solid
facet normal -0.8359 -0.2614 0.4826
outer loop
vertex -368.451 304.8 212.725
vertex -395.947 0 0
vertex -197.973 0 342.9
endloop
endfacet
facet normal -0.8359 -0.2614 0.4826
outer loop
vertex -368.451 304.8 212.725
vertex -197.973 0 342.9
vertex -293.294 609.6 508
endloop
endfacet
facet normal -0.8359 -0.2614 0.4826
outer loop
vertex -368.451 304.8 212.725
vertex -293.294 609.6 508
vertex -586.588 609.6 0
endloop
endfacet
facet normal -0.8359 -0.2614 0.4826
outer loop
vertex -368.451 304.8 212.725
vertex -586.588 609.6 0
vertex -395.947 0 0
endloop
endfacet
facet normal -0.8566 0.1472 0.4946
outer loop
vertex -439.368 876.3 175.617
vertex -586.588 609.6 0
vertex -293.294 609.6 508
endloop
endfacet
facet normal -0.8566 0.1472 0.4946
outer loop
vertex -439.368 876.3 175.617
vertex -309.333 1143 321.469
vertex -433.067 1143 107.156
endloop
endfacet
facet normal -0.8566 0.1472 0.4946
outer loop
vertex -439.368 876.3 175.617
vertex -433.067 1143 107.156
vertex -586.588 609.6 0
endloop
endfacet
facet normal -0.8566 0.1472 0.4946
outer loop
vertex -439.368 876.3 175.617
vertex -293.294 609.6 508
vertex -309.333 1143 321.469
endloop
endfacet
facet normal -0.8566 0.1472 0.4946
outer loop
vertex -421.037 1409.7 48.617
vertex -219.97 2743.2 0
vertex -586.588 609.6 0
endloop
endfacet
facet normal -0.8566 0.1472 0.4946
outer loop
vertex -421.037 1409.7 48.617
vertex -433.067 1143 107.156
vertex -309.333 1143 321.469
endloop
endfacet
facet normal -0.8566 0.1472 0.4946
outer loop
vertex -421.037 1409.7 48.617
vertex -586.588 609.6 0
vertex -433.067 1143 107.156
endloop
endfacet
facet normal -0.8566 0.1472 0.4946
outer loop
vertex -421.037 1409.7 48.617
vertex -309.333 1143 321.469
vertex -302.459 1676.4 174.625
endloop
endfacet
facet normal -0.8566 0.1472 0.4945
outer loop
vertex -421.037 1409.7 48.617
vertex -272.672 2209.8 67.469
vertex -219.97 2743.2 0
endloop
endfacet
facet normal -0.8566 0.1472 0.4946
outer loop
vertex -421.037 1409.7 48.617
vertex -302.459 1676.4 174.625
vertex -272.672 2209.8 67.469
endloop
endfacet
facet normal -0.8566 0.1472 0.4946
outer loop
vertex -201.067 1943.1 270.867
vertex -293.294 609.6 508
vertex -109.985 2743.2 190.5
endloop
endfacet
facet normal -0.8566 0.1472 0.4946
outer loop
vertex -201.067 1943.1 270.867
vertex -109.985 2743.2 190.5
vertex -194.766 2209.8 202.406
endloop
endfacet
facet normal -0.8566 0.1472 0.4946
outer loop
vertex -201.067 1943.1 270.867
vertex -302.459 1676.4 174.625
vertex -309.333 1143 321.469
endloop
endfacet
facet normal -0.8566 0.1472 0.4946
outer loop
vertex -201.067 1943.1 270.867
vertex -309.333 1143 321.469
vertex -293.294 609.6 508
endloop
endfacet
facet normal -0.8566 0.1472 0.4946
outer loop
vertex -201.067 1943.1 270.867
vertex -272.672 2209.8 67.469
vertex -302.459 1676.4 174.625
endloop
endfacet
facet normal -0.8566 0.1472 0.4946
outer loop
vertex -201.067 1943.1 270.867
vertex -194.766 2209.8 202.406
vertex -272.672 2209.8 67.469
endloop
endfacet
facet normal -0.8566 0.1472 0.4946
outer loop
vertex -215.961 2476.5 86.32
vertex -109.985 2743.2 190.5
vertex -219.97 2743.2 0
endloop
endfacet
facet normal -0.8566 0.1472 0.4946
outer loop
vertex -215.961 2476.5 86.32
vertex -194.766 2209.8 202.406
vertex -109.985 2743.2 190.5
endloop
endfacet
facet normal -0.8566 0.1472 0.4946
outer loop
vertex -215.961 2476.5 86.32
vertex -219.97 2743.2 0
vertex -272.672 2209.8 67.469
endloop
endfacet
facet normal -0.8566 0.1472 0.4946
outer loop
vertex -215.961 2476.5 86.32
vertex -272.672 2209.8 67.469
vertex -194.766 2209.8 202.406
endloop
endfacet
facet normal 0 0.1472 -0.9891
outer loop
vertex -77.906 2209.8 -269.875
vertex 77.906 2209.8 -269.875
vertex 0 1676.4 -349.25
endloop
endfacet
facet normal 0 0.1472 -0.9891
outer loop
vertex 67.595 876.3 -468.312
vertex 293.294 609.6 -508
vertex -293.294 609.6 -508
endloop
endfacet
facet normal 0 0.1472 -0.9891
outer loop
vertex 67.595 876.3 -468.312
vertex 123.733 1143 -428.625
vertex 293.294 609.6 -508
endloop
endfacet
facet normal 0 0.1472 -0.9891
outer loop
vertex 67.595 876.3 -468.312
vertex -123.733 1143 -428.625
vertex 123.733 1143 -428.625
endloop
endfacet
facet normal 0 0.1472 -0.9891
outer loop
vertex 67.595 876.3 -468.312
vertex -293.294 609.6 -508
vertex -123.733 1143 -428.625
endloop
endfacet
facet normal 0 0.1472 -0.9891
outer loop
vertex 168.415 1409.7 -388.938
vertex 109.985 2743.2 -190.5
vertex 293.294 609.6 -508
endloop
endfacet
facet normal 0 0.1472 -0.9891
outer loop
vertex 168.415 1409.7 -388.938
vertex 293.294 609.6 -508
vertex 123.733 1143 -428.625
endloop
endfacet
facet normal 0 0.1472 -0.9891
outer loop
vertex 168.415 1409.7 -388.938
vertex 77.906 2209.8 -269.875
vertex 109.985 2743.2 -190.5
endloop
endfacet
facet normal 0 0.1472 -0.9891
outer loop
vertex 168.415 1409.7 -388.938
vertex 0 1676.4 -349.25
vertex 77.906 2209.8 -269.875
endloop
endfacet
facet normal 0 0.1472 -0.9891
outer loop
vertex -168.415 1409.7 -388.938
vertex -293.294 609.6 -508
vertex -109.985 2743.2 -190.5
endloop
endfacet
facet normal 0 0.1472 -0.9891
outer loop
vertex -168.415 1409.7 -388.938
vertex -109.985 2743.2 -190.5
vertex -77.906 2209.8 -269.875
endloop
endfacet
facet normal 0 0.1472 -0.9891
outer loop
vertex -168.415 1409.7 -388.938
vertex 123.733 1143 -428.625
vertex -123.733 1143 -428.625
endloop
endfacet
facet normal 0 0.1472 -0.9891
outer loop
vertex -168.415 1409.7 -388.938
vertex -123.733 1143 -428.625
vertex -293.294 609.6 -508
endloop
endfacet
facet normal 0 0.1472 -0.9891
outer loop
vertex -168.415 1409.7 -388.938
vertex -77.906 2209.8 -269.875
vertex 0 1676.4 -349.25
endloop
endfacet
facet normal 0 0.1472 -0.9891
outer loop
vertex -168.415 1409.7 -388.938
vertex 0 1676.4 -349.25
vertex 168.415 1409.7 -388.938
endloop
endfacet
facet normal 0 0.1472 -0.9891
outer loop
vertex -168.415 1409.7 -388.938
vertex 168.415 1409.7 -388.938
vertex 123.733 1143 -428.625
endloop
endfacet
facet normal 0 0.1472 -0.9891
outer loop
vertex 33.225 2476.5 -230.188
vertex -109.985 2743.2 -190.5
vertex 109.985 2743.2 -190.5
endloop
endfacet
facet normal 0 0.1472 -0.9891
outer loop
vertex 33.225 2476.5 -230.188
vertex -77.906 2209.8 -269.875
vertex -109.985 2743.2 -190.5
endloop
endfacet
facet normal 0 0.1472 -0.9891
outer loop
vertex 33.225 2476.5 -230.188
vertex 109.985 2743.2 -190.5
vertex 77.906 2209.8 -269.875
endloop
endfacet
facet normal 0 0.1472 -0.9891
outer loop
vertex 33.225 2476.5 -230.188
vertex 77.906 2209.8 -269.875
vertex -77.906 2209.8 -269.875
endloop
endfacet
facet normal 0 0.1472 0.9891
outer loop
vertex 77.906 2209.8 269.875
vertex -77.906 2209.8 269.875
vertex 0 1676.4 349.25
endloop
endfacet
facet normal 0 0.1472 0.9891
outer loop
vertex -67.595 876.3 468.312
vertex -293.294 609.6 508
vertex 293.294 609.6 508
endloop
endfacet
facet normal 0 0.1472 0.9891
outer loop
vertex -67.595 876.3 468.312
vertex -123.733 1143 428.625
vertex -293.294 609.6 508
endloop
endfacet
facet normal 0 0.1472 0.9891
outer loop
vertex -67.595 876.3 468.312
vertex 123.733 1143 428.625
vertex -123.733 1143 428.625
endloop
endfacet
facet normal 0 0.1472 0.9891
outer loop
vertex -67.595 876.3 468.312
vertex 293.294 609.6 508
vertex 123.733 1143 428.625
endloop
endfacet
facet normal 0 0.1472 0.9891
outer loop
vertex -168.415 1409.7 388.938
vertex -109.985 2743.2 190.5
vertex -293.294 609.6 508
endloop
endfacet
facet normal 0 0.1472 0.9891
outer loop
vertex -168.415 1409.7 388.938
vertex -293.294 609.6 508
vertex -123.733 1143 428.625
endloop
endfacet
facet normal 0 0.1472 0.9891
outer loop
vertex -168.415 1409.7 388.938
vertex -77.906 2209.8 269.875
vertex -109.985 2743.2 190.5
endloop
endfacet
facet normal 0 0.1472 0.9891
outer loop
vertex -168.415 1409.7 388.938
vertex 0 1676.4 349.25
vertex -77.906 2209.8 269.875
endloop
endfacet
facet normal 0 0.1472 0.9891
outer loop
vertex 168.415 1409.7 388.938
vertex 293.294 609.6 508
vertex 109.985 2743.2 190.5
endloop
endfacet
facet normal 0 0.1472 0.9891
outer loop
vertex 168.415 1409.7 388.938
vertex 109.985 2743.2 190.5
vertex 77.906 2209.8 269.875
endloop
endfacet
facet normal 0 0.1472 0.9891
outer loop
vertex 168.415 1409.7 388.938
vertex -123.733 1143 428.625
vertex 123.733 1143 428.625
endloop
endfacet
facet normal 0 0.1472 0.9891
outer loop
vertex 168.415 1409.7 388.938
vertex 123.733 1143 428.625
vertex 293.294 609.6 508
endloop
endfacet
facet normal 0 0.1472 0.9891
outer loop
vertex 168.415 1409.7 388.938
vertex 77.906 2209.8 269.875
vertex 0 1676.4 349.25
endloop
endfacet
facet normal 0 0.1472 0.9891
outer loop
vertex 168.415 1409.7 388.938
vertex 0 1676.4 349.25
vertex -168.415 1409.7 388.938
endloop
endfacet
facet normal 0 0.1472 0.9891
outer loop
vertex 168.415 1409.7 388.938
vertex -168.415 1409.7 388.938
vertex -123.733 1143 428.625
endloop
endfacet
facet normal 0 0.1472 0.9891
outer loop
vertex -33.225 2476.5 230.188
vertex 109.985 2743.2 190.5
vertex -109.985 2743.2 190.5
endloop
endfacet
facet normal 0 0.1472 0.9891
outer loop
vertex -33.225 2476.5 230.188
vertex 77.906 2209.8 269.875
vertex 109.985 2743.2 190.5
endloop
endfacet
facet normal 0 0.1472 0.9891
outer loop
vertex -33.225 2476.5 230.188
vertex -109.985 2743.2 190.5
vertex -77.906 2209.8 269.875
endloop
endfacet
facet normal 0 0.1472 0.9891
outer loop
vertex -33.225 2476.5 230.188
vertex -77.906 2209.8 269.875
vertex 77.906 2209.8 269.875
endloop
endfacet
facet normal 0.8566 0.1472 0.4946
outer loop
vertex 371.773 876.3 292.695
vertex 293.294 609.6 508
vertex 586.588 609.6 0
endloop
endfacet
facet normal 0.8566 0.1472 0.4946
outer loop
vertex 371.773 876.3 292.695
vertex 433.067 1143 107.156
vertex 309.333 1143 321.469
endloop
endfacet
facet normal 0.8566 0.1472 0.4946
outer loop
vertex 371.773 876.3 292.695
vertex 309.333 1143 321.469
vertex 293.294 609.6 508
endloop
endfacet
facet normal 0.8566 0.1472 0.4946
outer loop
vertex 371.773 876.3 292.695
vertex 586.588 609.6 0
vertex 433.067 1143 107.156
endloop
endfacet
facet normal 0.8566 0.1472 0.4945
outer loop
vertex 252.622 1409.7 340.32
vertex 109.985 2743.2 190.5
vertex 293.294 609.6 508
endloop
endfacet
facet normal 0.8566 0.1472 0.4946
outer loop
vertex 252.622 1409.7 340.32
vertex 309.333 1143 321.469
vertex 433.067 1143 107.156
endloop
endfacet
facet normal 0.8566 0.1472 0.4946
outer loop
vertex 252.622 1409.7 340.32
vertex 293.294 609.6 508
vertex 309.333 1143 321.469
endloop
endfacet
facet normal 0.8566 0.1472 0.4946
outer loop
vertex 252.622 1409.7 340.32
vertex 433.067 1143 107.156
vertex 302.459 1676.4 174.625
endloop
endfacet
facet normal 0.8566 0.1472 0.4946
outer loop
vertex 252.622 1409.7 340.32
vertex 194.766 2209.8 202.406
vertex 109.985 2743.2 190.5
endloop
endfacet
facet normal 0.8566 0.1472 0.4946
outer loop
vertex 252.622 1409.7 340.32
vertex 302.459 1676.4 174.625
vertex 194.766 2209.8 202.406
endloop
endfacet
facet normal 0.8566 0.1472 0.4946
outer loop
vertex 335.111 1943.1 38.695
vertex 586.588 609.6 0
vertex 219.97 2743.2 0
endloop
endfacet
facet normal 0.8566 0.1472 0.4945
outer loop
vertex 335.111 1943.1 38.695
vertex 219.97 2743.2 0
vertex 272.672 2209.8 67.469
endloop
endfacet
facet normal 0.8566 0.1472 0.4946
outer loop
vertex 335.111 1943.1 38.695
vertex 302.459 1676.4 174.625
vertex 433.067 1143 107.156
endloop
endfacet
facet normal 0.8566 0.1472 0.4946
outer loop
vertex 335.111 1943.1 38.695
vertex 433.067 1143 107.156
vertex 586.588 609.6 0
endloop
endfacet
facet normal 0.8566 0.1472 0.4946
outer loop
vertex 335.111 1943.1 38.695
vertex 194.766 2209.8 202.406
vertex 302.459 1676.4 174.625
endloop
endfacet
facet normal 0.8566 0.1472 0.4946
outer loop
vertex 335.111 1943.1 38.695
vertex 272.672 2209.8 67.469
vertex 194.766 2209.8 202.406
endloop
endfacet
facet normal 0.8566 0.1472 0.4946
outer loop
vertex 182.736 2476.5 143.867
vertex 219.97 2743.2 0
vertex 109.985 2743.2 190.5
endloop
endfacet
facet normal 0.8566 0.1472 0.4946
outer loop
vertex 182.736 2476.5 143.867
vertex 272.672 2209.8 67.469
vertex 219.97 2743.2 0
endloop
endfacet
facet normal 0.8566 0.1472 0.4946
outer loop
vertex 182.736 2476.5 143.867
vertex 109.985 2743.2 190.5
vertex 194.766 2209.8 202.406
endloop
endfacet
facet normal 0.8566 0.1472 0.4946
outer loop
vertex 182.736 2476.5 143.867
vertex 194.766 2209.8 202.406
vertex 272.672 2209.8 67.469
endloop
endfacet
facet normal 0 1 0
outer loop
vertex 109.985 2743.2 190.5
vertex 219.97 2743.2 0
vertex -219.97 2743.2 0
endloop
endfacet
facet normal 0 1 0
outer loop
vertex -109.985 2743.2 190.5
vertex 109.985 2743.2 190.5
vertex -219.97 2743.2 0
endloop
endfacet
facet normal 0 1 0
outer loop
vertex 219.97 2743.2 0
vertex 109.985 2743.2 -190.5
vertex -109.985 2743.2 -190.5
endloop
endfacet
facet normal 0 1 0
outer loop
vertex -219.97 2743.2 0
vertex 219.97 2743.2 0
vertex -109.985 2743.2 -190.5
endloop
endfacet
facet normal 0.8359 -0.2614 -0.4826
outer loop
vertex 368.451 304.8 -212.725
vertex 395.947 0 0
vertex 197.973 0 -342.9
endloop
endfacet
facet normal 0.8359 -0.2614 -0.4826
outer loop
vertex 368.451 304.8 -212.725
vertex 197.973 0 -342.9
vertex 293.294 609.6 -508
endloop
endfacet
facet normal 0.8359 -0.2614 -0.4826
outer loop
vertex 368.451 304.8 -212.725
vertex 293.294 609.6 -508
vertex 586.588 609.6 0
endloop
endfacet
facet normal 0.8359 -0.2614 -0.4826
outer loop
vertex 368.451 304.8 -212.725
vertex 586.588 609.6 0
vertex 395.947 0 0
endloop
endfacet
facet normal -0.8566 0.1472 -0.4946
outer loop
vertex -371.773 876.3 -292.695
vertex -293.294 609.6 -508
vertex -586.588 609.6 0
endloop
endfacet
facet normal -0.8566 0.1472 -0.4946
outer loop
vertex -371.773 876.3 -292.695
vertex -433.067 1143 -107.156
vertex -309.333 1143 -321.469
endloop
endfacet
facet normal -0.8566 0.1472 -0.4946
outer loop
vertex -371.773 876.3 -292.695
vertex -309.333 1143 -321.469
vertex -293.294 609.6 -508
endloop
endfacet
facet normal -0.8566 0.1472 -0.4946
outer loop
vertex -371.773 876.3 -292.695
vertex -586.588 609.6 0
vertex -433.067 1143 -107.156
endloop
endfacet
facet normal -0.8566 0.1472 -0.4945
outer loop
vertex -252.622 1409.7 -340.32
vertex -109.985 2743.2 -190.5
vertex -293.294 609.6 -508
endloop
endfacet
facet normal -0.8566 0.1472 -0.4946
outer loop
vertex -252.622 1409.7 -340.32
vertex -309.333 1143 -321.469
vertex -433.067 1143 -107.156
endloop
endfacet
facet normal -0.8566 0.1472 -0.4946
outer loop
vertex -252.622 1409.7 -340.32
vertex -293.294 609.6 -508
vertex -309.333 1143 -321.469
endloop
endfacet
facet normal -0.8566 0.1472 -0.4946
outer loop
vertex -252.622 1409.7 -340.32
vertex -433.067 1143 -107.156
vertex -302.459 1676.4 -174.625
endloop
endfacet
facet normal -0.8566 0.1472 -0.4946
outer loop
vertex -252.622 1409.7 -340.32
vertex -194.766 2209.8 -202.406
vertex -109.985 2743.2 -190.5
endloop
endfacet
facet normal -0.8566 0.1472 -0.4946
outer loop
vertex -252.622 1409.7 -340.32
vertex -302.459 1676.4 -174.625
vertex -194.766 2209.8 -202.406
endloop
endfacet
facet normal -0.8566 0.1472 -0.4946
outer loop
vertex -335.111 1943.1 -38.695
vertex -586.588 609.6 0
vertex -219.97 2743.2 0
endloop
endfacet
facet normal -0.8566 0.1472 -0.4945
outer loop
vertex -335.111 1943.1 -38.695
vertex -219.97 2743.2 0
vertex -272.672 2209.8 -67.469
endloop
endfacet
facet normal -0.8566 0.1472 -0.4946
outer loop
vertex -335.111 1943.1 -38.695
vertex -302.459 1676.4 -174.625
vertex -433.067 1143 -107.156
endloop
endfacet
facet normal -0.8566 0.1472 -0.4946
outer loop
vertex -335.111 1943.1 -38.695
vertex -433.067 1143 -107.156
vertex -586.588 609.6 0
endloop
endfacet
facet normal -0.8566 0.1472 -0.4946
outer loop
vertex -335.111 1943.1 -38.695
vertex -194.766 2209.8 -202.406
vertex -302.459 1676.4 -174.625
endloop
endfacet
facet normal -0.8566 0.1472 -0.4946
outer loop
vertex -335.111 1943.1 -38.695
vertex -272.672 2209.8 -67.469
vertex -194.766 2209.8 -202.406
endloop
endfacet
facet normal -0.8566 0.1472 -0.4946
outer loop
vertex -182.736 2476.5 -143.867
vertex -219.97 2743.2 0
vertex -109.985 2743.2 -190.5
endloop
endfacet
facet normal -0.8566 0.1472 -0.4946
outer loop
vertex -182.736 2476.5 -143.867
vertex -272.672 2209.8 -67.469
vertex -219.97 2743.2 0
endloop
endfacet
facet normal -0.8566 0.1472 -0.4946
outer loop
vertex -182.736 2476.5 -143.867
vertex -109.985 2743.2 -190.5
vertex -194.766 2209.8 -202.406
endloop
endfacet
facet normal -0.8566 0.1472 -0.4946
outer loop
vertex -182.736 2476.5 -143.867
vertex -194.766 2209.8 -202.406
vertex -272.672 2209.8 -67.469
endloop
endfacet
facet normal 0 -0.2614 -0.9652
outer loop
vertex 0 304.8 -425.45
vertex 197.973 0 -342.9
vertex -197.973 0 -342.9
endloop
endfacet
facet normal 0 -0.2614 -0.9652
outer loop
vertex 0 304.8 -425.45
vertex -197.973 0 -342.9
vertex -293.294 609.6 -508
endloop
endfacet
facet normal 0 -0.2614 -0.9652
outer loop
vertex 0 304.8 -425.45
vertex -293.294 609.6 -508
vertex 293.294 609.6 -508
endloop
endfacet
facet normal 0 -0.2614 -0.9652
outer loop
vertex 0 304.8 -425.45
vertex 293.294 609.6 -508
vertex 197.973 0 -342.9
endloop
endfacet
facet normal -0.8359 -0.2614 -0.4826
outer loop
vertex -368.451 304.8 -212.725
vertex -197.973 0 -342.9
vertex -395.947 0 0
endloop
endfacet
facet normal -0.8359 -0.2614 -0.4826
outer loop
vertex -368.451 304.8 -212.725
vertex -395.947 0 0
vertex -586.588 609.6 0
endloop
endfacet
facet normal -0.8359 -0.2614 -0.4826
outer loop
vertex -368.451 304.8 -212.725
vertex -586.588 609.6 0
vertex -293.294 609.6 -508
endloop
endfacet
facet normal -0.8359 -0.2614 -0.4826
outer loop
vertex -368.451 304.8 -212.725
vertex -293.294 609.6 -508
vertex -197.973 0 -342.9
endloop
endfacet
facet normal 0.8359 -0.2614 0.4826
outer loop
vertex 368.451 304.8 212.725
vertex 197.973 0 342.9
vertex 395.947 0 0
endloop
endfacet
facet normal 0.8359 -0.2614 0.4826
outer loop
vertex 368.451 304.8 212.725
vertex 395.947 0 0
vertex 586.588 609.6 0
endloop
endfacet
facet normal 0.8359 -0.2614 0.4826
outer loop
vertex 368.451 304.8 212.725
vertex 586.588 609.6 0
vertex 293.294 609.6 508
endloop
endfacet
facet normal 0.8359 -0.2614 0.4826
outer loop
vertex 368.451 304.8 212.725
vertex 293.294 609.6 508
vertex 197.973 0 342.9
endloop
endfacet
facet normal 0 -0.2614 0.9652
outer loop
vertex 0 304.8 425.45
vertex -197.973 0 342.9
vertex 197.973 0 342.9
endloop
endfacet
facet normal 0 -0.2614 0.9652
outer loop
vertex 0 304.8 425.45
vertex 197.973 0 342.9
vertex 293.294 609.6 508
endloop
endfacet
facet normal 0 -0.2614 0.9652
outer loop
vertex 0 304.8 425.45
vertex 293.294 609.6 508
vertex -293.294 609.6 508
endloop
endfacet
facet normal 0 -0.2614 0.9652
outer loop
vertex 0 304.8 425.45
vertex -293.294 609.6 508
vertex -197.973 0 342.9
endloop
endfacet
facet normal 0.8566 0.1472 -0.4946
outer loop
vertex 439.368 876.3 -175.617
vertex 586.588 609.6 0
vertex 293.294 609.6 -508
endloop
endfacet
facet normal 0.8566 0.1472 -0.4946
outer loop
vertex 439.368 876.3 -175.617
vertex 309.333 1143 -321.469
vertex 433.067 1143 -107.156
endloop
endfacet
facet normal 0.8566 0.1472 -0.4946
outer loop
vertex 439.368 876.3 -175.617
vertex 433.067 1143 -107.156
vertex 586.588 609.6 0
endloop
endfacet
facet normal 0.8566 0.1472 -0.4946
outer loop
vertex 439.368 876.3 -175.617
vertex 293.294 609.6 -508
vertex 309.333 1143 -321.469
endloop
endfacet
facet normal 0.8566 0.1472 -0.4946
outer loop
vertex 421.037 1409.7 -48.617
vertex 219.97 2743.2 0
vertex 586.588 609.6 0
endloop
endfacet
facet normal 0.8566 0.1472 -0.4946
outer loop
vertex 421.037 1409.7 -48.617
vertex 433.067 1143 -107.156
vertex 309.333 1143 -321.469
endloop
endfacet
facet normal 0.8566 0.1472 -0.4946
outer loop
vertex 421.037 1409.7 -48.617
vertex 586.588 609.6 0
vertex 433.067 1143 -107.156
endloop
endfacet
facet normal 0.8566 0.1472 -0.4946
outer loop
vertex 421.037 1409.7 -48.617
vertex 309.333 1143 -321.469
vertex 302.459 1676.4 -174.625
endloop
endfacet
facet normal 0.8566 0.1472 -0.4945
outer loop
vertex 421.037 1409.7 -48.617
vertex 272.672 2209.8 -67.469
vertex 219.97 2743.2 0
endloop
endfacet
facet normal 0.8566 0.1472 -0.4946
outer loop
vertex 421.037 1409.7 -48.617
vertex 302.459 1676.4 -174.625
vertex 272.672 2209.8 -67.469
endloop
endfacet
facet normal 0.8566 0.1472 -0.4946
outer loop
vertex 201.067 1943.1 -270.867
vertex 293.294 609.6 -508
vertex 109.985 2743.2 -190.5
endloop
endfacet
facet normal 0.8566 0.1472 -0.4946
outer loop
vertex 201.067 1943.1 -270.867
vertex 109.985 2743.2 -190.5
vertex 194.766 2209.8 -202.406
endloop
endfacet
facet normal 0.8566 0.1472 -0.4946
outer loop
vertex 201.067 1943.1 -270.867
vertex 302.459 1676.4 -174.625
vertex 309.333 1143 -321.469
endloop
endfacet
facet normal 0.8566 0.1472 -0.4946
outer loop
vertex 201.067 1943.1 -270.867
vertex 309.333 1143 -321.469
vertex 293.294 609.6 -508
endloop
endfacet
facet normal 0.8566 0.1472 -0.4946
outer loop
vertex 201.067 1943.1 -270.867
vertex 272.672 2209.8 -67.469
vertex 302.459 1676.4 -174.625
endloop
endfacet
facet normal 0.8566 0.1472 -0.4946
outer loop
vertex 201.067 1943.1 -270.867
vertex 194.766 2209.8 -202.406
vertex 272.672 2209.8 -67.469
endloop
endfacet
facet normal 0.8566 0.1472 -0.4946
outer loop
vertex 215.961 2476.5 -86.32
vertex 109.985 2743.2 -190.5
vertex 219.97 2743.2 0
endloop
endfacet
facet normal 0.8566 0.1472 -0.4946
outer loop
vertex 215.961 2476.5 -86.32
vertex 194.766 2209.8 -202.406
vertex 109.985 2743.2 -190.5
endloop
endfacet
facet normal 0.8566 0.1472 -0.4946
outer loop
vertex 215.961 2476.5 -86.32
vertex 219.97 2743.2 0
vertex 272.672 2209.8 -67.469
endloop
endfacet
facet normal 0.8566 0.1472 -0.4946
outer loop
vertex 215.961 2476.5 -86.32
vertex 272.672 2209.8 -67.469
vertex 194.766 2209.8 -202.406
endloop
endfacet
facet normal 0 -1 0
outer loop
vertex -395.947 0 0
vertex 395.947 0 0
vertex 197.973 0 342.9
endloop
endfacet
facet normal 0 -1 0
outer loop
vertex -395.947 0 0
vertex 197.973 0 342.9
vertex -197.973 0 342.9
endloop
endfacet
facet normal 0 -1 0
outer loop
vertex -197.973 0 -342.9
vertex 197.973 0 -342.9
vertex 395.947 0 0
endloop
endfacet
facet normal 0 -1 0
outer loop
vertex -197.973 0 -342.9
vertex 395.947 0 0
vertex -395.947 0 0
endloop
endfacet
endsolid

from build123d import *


with BuildPart() as part:
    # Sketch1 → Loft6 section 0
    with BuildSketch(Plane(origin=(0, 0, 0), x_dir=(1, 0, 0), z_dir=(0, 1, 0))):
        with BuildLine():
            Line((395.94681461, 0), (197.973407305, 342.9))
            Line((197.973407305, 342.9), (-197.973407305, 342.9))
            Line((-197.973407305, 342.9), (-395.94681461, 0))
            Line((-395.94681461, 0), (-197.973407305, -342.9))
            Line((-197.973407305, -342.9), (197.973407305, -342.9))
            Line((197.973407305, -342.9), (395.94681461, 0))
        make_face()
    # Sketch3 → Loft6 section 1
    with BuildSketch(Plane(origin=(0, 609.6, 0), x_dir=(-1, 0, 0), z_dir=(0, 1, 0))):
        with BuildLine():
            Line((-586.587873497, 0), (-293.293936748, -508))
            Line((-293.293936748, -508), (293.293936748, -508))
            Line((293.293936748, -508), (586.587873497, 0))
            Line((586.587873497, 0), (293.293936748, 508))
            Line((293.293936748, 508), (-293.293936748, 508))
            Line((-293.293936748, 508), (-586.587873497, 0))
        make_face()
    loft()

    # Sketch3<4> → Loft7 section 0
    with BuildSketch(Plane(origin=(0, 609.6, 0), x_dir=(-1, 0, 0), z_dir=(0, 1, 0))):
        with BuildLine():
            Line((-586.587873497, 0), (-293.293936748, -508))
            Line((-293.293936748, -508), (293.293936748, -508))
            Line((293.293936748, -508), (586.587873497, 0))
            Line((586.587873497, 0), (293.293936748, 508))
            Line((293.293936748, 508), (-293.293936748, 508))
            Line((-293.293936748, 508), (-586.587873497, 0))
        make_face()
    # Sketch4 → Loft7 section 1
    with BuildSketch(Plane(origin=(0, 2743.2, 0), x_dir=(-1, 0, 0), z_dir=(0, 1, 0))):
        with BuildLine():
            Line((219.970452561, 0), (109.985226281, 190.5))
            Line((109.985226281, 190.5), (-109.985226281, 190.5))
            Line((-109.985226281, 190.5), (-219.970452561, 0))
            Line((-219.970452561, 0), (-109.985226281, -190.5))
            Line((-109.985226281, -190.5), (109.985226281, -190.5))
            Line((109.985226281, -190.5), (219.970452561, 0))
        make_face()
    loft()


solid = part.part
